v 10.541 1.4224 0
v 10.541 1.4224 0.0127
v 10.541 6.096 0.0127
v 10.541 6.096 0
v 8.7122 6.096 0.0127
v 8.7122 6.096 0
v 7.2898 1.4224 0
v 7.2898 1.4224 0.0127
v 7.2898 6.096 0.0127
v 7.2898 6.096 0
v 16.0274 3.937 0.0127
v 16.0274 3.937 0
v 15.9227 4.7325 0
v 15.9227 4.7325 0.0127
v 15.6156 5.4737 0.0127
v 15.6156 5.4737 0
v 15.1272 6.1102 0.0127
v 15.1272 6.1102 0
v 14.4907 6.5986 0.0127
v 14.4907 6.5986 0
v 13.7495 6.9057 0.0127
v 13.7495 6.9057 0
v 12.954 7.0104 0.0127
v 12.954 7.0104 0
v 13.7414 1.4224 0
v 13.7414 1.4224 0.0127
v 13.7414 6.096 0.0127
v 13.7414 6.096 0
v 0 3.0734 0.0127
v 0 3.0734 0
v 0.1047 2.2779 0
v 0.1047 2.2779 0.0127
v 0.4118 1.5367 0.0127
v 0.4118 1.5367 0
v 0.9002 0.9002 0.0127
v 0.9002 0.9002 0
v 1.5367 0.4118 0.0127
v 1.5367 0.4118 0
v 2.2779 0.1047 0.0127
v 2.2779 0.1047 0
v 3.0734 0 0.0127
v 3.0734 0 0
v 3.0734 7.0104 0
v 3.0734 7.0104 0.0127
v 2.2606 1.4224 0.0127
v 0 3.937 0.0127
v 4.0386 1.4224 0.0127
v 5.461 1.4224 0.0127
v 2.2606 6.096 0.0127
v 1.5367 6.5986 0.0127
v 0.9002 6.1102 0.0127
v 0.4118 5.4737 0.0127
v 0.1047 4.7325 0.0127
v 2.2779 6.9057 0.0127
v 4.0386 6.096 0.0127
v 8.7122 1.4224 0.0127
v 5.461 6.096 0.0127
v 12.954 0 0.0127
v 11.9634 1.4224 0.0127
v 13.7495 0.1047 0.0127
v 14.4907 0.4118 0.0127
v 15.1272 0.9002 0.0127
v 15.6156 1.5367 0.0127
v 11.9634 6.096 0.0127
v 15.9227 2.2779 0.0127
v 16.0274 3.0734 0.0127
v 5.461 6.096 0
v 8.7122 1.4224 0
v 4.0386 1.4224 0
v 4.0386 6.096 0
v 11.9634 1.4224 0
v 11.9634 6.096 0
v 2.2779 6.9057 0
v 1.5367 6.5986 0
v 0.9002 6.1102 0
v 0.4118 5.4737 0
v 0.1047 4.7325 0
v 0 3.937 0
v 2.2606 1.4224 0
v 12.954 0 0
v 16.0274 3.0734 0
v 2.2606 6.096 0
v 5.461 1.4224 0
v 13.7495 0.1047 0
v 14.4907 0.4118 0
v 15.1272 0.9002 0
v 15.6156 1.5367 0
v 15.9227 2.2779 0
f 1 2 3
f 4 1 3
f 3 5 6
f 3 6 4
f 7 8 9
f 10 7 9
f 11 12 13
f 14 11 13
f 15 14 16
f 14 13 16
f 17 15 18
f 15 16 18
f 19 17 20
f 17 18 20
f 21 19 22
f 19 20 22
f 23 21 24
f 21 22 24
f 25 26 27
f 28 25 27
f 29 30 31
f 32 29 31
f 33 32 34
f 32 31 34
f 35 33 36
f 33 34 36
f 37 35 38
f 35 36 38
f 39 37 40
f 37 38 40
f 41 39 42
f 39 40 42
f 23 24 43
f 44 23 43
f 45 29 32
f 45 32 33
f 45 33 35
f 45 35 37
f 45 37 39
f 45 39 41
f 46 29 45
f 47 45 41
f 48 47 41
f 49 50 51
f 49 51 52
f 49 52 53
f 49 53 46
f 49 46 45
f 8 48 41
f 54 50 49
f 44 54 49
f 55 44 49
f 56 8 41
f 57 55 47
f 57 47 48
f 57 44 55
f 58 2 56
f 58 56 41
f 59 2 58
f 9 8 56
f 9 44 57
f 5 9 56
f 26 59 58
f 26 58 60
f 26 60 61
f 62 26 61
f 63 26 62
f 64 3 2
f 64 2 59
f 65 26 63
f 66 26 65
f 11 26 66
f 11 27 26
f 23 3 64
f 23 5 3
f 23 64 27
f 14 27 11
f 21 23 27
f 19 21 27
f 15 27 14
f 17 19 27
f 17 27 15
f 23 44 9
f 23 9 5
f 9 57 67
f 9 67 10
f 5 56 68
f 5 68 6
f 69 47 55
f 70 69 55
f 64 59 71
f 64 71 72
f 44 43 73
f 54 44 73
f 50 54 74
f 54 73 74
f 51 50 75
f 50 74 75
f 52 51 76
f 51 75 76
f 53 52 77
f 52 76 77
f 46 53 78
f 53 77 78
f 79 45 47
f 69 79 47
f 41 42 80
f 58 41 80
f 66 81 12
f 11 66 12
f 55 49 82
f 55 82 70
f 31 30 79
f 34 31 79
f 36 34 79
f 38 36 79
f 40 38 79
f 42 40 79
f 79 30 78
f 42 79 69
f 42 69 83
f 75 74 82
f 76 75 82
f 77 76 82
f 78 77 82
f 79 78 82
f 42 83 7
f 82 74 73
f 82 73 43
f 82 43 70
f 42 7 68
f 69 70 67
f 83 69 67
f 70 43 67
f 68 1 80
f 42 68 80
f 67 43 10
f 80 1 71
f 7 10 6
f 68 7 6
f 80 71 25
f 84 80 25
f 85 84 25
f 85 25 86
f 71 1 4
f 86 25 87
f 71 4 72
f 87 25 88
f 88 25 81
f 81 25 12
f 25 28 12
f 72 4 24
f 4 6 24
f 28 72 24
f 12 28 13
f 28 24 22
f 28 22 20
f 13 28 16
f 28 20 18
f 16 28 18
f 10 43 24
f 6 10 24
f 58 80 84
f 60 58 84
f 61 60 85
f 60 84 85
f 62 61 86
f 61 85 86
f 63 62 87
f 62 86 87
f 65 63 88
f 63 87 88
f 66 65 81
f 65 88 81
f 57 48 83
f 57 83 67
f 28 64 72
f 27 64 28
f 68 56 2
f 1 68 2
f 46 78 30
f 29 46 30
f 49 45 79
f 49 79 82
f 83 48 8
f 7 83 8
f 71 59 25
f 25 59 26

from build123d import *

# Parameters (mm, degrees)
BOSS_EXTRUDE1_DEPTH       = 0.0127
SKETCH2_W                 = 1.778
SKETCH2_H                 = 4.6736
CUT_EXTRUDE1_DEPTH        = 1.0127
LPATTERN1_COUNT           = 2
LPATTERN1_PITCH           = 3.2004
LPATTERN2_COUNT           = 3
LPATTERN2_PITCH           = 3.2512
LPATTERN2_COPY_1_SKETCH_W = 1.778
LPATTERN2_COPY_1_SKETCH_H = 4.6736
LPATTERN2_COPY_1_DEPTH    = 1.0127
LPATTERN2_COPY_2_SKETCH_W = 1.778
LPATTERN2_COPY_2_SKETCH_H = 4.6736
LPATTERN2_COPY_2_DEPTH    = 1.0127


with BuildPart() as part:
    # Sketch1 → Boss-Extrude1 (new body)
    with BuildSketch(Plane.XY):
        with BuildLine():
            Line((3.0734, 0), (12.954, 0))
            ThreePointArc((12.954, 0), (15.127221981, 0.900178019), (16.0274, 3.0734))
            Line((16.0274, 3.0734), (16.0274, 3.937))
            ThreePointArc((16.0274, 3.937), (15.127221981, 6.110221981), (12.954, 7.0104))
            Line((12.954, 7.0104), (3.0734, 7.0104))
            ThreePointArc((3.0734, 7.0104), (0.900178019, 6.110221981), (0, 3.937))
            Line((0, 3.937), (0, 3.0734))
            ThreePointArc((0, 3.0734), (0.900178019, 0.900178019), (3.0734, 0))
        make_face()
    extrude(amount=BOSS_EXTRUDE1_DEPTH)

    # Sketch2 → Cut-Extrude1 (cut, through all)
    with BuildSketch(Plane.XY.offset(0.0127)):
        with Locations((3.1496, 3.7592)):
            Rectangle(SKETCH2_W, SKETCH2_H)
    cut_extrude1 = extrude(amount=-CUT_EXTRUDE1_DEPTH, mode=Mode.SUBTRACT)

    # LPattern1: Cut-Extrude1 ×2
    with Locations(*[(i * LPATTERN1_PITCH, 0, 0) for i in range(1, LPATTERN1_COUNT)]):
        add(cut_extrude1, mode=Mode.SUBTRACT)

    # LPattern2: Cut-Extrude1 ×3
    with Locations(*[(i * LPATTERN2_PITCH, 0, 0) for i in range(1, LPATTERN2_COUNT)]):
        add(cut_extrude1, mode=Mode.SUBTRACT)

    # LPattern2 copy 1 sketch → LPattern2 copy 1 (cut, through all)
    with BuildSketch(Plane(origin=(6.4516, 0, 0.0127), x_dir=(1, 0, 0), z_dir=(0, 0, 1))):
        with Locations((3.1496, 3.7592)):
            Rectangle(LPATTERN2_COPY_1_SKETCH_W, LPATTERN2_COPY_1_SKETCH_H)
    extrude(amount=-LPATTERN2_COPY_1_DEPTH, mode=Mode.SUBTRACT)

    # LPattern2 copy 2 sketch → LPattern2 copy 2 (cut, through all)
    with BuildSketch(Plane(origin=(9.7028, 0, 0.0127), x_dir=(1, 0, 0), z_dir=(0, 0, 1))):
        with Locations((3.1496, 3.7592)):
            Rectangle(LPATTERN2_COPY_2_SKETCH_W, LPATTERN2_COPY_2_SKETCH_H)
    extrude(amount=-LPATTERN2_COPY_2_DEPTH, mode=Mode.SUBTRACT)


solid = part.part
